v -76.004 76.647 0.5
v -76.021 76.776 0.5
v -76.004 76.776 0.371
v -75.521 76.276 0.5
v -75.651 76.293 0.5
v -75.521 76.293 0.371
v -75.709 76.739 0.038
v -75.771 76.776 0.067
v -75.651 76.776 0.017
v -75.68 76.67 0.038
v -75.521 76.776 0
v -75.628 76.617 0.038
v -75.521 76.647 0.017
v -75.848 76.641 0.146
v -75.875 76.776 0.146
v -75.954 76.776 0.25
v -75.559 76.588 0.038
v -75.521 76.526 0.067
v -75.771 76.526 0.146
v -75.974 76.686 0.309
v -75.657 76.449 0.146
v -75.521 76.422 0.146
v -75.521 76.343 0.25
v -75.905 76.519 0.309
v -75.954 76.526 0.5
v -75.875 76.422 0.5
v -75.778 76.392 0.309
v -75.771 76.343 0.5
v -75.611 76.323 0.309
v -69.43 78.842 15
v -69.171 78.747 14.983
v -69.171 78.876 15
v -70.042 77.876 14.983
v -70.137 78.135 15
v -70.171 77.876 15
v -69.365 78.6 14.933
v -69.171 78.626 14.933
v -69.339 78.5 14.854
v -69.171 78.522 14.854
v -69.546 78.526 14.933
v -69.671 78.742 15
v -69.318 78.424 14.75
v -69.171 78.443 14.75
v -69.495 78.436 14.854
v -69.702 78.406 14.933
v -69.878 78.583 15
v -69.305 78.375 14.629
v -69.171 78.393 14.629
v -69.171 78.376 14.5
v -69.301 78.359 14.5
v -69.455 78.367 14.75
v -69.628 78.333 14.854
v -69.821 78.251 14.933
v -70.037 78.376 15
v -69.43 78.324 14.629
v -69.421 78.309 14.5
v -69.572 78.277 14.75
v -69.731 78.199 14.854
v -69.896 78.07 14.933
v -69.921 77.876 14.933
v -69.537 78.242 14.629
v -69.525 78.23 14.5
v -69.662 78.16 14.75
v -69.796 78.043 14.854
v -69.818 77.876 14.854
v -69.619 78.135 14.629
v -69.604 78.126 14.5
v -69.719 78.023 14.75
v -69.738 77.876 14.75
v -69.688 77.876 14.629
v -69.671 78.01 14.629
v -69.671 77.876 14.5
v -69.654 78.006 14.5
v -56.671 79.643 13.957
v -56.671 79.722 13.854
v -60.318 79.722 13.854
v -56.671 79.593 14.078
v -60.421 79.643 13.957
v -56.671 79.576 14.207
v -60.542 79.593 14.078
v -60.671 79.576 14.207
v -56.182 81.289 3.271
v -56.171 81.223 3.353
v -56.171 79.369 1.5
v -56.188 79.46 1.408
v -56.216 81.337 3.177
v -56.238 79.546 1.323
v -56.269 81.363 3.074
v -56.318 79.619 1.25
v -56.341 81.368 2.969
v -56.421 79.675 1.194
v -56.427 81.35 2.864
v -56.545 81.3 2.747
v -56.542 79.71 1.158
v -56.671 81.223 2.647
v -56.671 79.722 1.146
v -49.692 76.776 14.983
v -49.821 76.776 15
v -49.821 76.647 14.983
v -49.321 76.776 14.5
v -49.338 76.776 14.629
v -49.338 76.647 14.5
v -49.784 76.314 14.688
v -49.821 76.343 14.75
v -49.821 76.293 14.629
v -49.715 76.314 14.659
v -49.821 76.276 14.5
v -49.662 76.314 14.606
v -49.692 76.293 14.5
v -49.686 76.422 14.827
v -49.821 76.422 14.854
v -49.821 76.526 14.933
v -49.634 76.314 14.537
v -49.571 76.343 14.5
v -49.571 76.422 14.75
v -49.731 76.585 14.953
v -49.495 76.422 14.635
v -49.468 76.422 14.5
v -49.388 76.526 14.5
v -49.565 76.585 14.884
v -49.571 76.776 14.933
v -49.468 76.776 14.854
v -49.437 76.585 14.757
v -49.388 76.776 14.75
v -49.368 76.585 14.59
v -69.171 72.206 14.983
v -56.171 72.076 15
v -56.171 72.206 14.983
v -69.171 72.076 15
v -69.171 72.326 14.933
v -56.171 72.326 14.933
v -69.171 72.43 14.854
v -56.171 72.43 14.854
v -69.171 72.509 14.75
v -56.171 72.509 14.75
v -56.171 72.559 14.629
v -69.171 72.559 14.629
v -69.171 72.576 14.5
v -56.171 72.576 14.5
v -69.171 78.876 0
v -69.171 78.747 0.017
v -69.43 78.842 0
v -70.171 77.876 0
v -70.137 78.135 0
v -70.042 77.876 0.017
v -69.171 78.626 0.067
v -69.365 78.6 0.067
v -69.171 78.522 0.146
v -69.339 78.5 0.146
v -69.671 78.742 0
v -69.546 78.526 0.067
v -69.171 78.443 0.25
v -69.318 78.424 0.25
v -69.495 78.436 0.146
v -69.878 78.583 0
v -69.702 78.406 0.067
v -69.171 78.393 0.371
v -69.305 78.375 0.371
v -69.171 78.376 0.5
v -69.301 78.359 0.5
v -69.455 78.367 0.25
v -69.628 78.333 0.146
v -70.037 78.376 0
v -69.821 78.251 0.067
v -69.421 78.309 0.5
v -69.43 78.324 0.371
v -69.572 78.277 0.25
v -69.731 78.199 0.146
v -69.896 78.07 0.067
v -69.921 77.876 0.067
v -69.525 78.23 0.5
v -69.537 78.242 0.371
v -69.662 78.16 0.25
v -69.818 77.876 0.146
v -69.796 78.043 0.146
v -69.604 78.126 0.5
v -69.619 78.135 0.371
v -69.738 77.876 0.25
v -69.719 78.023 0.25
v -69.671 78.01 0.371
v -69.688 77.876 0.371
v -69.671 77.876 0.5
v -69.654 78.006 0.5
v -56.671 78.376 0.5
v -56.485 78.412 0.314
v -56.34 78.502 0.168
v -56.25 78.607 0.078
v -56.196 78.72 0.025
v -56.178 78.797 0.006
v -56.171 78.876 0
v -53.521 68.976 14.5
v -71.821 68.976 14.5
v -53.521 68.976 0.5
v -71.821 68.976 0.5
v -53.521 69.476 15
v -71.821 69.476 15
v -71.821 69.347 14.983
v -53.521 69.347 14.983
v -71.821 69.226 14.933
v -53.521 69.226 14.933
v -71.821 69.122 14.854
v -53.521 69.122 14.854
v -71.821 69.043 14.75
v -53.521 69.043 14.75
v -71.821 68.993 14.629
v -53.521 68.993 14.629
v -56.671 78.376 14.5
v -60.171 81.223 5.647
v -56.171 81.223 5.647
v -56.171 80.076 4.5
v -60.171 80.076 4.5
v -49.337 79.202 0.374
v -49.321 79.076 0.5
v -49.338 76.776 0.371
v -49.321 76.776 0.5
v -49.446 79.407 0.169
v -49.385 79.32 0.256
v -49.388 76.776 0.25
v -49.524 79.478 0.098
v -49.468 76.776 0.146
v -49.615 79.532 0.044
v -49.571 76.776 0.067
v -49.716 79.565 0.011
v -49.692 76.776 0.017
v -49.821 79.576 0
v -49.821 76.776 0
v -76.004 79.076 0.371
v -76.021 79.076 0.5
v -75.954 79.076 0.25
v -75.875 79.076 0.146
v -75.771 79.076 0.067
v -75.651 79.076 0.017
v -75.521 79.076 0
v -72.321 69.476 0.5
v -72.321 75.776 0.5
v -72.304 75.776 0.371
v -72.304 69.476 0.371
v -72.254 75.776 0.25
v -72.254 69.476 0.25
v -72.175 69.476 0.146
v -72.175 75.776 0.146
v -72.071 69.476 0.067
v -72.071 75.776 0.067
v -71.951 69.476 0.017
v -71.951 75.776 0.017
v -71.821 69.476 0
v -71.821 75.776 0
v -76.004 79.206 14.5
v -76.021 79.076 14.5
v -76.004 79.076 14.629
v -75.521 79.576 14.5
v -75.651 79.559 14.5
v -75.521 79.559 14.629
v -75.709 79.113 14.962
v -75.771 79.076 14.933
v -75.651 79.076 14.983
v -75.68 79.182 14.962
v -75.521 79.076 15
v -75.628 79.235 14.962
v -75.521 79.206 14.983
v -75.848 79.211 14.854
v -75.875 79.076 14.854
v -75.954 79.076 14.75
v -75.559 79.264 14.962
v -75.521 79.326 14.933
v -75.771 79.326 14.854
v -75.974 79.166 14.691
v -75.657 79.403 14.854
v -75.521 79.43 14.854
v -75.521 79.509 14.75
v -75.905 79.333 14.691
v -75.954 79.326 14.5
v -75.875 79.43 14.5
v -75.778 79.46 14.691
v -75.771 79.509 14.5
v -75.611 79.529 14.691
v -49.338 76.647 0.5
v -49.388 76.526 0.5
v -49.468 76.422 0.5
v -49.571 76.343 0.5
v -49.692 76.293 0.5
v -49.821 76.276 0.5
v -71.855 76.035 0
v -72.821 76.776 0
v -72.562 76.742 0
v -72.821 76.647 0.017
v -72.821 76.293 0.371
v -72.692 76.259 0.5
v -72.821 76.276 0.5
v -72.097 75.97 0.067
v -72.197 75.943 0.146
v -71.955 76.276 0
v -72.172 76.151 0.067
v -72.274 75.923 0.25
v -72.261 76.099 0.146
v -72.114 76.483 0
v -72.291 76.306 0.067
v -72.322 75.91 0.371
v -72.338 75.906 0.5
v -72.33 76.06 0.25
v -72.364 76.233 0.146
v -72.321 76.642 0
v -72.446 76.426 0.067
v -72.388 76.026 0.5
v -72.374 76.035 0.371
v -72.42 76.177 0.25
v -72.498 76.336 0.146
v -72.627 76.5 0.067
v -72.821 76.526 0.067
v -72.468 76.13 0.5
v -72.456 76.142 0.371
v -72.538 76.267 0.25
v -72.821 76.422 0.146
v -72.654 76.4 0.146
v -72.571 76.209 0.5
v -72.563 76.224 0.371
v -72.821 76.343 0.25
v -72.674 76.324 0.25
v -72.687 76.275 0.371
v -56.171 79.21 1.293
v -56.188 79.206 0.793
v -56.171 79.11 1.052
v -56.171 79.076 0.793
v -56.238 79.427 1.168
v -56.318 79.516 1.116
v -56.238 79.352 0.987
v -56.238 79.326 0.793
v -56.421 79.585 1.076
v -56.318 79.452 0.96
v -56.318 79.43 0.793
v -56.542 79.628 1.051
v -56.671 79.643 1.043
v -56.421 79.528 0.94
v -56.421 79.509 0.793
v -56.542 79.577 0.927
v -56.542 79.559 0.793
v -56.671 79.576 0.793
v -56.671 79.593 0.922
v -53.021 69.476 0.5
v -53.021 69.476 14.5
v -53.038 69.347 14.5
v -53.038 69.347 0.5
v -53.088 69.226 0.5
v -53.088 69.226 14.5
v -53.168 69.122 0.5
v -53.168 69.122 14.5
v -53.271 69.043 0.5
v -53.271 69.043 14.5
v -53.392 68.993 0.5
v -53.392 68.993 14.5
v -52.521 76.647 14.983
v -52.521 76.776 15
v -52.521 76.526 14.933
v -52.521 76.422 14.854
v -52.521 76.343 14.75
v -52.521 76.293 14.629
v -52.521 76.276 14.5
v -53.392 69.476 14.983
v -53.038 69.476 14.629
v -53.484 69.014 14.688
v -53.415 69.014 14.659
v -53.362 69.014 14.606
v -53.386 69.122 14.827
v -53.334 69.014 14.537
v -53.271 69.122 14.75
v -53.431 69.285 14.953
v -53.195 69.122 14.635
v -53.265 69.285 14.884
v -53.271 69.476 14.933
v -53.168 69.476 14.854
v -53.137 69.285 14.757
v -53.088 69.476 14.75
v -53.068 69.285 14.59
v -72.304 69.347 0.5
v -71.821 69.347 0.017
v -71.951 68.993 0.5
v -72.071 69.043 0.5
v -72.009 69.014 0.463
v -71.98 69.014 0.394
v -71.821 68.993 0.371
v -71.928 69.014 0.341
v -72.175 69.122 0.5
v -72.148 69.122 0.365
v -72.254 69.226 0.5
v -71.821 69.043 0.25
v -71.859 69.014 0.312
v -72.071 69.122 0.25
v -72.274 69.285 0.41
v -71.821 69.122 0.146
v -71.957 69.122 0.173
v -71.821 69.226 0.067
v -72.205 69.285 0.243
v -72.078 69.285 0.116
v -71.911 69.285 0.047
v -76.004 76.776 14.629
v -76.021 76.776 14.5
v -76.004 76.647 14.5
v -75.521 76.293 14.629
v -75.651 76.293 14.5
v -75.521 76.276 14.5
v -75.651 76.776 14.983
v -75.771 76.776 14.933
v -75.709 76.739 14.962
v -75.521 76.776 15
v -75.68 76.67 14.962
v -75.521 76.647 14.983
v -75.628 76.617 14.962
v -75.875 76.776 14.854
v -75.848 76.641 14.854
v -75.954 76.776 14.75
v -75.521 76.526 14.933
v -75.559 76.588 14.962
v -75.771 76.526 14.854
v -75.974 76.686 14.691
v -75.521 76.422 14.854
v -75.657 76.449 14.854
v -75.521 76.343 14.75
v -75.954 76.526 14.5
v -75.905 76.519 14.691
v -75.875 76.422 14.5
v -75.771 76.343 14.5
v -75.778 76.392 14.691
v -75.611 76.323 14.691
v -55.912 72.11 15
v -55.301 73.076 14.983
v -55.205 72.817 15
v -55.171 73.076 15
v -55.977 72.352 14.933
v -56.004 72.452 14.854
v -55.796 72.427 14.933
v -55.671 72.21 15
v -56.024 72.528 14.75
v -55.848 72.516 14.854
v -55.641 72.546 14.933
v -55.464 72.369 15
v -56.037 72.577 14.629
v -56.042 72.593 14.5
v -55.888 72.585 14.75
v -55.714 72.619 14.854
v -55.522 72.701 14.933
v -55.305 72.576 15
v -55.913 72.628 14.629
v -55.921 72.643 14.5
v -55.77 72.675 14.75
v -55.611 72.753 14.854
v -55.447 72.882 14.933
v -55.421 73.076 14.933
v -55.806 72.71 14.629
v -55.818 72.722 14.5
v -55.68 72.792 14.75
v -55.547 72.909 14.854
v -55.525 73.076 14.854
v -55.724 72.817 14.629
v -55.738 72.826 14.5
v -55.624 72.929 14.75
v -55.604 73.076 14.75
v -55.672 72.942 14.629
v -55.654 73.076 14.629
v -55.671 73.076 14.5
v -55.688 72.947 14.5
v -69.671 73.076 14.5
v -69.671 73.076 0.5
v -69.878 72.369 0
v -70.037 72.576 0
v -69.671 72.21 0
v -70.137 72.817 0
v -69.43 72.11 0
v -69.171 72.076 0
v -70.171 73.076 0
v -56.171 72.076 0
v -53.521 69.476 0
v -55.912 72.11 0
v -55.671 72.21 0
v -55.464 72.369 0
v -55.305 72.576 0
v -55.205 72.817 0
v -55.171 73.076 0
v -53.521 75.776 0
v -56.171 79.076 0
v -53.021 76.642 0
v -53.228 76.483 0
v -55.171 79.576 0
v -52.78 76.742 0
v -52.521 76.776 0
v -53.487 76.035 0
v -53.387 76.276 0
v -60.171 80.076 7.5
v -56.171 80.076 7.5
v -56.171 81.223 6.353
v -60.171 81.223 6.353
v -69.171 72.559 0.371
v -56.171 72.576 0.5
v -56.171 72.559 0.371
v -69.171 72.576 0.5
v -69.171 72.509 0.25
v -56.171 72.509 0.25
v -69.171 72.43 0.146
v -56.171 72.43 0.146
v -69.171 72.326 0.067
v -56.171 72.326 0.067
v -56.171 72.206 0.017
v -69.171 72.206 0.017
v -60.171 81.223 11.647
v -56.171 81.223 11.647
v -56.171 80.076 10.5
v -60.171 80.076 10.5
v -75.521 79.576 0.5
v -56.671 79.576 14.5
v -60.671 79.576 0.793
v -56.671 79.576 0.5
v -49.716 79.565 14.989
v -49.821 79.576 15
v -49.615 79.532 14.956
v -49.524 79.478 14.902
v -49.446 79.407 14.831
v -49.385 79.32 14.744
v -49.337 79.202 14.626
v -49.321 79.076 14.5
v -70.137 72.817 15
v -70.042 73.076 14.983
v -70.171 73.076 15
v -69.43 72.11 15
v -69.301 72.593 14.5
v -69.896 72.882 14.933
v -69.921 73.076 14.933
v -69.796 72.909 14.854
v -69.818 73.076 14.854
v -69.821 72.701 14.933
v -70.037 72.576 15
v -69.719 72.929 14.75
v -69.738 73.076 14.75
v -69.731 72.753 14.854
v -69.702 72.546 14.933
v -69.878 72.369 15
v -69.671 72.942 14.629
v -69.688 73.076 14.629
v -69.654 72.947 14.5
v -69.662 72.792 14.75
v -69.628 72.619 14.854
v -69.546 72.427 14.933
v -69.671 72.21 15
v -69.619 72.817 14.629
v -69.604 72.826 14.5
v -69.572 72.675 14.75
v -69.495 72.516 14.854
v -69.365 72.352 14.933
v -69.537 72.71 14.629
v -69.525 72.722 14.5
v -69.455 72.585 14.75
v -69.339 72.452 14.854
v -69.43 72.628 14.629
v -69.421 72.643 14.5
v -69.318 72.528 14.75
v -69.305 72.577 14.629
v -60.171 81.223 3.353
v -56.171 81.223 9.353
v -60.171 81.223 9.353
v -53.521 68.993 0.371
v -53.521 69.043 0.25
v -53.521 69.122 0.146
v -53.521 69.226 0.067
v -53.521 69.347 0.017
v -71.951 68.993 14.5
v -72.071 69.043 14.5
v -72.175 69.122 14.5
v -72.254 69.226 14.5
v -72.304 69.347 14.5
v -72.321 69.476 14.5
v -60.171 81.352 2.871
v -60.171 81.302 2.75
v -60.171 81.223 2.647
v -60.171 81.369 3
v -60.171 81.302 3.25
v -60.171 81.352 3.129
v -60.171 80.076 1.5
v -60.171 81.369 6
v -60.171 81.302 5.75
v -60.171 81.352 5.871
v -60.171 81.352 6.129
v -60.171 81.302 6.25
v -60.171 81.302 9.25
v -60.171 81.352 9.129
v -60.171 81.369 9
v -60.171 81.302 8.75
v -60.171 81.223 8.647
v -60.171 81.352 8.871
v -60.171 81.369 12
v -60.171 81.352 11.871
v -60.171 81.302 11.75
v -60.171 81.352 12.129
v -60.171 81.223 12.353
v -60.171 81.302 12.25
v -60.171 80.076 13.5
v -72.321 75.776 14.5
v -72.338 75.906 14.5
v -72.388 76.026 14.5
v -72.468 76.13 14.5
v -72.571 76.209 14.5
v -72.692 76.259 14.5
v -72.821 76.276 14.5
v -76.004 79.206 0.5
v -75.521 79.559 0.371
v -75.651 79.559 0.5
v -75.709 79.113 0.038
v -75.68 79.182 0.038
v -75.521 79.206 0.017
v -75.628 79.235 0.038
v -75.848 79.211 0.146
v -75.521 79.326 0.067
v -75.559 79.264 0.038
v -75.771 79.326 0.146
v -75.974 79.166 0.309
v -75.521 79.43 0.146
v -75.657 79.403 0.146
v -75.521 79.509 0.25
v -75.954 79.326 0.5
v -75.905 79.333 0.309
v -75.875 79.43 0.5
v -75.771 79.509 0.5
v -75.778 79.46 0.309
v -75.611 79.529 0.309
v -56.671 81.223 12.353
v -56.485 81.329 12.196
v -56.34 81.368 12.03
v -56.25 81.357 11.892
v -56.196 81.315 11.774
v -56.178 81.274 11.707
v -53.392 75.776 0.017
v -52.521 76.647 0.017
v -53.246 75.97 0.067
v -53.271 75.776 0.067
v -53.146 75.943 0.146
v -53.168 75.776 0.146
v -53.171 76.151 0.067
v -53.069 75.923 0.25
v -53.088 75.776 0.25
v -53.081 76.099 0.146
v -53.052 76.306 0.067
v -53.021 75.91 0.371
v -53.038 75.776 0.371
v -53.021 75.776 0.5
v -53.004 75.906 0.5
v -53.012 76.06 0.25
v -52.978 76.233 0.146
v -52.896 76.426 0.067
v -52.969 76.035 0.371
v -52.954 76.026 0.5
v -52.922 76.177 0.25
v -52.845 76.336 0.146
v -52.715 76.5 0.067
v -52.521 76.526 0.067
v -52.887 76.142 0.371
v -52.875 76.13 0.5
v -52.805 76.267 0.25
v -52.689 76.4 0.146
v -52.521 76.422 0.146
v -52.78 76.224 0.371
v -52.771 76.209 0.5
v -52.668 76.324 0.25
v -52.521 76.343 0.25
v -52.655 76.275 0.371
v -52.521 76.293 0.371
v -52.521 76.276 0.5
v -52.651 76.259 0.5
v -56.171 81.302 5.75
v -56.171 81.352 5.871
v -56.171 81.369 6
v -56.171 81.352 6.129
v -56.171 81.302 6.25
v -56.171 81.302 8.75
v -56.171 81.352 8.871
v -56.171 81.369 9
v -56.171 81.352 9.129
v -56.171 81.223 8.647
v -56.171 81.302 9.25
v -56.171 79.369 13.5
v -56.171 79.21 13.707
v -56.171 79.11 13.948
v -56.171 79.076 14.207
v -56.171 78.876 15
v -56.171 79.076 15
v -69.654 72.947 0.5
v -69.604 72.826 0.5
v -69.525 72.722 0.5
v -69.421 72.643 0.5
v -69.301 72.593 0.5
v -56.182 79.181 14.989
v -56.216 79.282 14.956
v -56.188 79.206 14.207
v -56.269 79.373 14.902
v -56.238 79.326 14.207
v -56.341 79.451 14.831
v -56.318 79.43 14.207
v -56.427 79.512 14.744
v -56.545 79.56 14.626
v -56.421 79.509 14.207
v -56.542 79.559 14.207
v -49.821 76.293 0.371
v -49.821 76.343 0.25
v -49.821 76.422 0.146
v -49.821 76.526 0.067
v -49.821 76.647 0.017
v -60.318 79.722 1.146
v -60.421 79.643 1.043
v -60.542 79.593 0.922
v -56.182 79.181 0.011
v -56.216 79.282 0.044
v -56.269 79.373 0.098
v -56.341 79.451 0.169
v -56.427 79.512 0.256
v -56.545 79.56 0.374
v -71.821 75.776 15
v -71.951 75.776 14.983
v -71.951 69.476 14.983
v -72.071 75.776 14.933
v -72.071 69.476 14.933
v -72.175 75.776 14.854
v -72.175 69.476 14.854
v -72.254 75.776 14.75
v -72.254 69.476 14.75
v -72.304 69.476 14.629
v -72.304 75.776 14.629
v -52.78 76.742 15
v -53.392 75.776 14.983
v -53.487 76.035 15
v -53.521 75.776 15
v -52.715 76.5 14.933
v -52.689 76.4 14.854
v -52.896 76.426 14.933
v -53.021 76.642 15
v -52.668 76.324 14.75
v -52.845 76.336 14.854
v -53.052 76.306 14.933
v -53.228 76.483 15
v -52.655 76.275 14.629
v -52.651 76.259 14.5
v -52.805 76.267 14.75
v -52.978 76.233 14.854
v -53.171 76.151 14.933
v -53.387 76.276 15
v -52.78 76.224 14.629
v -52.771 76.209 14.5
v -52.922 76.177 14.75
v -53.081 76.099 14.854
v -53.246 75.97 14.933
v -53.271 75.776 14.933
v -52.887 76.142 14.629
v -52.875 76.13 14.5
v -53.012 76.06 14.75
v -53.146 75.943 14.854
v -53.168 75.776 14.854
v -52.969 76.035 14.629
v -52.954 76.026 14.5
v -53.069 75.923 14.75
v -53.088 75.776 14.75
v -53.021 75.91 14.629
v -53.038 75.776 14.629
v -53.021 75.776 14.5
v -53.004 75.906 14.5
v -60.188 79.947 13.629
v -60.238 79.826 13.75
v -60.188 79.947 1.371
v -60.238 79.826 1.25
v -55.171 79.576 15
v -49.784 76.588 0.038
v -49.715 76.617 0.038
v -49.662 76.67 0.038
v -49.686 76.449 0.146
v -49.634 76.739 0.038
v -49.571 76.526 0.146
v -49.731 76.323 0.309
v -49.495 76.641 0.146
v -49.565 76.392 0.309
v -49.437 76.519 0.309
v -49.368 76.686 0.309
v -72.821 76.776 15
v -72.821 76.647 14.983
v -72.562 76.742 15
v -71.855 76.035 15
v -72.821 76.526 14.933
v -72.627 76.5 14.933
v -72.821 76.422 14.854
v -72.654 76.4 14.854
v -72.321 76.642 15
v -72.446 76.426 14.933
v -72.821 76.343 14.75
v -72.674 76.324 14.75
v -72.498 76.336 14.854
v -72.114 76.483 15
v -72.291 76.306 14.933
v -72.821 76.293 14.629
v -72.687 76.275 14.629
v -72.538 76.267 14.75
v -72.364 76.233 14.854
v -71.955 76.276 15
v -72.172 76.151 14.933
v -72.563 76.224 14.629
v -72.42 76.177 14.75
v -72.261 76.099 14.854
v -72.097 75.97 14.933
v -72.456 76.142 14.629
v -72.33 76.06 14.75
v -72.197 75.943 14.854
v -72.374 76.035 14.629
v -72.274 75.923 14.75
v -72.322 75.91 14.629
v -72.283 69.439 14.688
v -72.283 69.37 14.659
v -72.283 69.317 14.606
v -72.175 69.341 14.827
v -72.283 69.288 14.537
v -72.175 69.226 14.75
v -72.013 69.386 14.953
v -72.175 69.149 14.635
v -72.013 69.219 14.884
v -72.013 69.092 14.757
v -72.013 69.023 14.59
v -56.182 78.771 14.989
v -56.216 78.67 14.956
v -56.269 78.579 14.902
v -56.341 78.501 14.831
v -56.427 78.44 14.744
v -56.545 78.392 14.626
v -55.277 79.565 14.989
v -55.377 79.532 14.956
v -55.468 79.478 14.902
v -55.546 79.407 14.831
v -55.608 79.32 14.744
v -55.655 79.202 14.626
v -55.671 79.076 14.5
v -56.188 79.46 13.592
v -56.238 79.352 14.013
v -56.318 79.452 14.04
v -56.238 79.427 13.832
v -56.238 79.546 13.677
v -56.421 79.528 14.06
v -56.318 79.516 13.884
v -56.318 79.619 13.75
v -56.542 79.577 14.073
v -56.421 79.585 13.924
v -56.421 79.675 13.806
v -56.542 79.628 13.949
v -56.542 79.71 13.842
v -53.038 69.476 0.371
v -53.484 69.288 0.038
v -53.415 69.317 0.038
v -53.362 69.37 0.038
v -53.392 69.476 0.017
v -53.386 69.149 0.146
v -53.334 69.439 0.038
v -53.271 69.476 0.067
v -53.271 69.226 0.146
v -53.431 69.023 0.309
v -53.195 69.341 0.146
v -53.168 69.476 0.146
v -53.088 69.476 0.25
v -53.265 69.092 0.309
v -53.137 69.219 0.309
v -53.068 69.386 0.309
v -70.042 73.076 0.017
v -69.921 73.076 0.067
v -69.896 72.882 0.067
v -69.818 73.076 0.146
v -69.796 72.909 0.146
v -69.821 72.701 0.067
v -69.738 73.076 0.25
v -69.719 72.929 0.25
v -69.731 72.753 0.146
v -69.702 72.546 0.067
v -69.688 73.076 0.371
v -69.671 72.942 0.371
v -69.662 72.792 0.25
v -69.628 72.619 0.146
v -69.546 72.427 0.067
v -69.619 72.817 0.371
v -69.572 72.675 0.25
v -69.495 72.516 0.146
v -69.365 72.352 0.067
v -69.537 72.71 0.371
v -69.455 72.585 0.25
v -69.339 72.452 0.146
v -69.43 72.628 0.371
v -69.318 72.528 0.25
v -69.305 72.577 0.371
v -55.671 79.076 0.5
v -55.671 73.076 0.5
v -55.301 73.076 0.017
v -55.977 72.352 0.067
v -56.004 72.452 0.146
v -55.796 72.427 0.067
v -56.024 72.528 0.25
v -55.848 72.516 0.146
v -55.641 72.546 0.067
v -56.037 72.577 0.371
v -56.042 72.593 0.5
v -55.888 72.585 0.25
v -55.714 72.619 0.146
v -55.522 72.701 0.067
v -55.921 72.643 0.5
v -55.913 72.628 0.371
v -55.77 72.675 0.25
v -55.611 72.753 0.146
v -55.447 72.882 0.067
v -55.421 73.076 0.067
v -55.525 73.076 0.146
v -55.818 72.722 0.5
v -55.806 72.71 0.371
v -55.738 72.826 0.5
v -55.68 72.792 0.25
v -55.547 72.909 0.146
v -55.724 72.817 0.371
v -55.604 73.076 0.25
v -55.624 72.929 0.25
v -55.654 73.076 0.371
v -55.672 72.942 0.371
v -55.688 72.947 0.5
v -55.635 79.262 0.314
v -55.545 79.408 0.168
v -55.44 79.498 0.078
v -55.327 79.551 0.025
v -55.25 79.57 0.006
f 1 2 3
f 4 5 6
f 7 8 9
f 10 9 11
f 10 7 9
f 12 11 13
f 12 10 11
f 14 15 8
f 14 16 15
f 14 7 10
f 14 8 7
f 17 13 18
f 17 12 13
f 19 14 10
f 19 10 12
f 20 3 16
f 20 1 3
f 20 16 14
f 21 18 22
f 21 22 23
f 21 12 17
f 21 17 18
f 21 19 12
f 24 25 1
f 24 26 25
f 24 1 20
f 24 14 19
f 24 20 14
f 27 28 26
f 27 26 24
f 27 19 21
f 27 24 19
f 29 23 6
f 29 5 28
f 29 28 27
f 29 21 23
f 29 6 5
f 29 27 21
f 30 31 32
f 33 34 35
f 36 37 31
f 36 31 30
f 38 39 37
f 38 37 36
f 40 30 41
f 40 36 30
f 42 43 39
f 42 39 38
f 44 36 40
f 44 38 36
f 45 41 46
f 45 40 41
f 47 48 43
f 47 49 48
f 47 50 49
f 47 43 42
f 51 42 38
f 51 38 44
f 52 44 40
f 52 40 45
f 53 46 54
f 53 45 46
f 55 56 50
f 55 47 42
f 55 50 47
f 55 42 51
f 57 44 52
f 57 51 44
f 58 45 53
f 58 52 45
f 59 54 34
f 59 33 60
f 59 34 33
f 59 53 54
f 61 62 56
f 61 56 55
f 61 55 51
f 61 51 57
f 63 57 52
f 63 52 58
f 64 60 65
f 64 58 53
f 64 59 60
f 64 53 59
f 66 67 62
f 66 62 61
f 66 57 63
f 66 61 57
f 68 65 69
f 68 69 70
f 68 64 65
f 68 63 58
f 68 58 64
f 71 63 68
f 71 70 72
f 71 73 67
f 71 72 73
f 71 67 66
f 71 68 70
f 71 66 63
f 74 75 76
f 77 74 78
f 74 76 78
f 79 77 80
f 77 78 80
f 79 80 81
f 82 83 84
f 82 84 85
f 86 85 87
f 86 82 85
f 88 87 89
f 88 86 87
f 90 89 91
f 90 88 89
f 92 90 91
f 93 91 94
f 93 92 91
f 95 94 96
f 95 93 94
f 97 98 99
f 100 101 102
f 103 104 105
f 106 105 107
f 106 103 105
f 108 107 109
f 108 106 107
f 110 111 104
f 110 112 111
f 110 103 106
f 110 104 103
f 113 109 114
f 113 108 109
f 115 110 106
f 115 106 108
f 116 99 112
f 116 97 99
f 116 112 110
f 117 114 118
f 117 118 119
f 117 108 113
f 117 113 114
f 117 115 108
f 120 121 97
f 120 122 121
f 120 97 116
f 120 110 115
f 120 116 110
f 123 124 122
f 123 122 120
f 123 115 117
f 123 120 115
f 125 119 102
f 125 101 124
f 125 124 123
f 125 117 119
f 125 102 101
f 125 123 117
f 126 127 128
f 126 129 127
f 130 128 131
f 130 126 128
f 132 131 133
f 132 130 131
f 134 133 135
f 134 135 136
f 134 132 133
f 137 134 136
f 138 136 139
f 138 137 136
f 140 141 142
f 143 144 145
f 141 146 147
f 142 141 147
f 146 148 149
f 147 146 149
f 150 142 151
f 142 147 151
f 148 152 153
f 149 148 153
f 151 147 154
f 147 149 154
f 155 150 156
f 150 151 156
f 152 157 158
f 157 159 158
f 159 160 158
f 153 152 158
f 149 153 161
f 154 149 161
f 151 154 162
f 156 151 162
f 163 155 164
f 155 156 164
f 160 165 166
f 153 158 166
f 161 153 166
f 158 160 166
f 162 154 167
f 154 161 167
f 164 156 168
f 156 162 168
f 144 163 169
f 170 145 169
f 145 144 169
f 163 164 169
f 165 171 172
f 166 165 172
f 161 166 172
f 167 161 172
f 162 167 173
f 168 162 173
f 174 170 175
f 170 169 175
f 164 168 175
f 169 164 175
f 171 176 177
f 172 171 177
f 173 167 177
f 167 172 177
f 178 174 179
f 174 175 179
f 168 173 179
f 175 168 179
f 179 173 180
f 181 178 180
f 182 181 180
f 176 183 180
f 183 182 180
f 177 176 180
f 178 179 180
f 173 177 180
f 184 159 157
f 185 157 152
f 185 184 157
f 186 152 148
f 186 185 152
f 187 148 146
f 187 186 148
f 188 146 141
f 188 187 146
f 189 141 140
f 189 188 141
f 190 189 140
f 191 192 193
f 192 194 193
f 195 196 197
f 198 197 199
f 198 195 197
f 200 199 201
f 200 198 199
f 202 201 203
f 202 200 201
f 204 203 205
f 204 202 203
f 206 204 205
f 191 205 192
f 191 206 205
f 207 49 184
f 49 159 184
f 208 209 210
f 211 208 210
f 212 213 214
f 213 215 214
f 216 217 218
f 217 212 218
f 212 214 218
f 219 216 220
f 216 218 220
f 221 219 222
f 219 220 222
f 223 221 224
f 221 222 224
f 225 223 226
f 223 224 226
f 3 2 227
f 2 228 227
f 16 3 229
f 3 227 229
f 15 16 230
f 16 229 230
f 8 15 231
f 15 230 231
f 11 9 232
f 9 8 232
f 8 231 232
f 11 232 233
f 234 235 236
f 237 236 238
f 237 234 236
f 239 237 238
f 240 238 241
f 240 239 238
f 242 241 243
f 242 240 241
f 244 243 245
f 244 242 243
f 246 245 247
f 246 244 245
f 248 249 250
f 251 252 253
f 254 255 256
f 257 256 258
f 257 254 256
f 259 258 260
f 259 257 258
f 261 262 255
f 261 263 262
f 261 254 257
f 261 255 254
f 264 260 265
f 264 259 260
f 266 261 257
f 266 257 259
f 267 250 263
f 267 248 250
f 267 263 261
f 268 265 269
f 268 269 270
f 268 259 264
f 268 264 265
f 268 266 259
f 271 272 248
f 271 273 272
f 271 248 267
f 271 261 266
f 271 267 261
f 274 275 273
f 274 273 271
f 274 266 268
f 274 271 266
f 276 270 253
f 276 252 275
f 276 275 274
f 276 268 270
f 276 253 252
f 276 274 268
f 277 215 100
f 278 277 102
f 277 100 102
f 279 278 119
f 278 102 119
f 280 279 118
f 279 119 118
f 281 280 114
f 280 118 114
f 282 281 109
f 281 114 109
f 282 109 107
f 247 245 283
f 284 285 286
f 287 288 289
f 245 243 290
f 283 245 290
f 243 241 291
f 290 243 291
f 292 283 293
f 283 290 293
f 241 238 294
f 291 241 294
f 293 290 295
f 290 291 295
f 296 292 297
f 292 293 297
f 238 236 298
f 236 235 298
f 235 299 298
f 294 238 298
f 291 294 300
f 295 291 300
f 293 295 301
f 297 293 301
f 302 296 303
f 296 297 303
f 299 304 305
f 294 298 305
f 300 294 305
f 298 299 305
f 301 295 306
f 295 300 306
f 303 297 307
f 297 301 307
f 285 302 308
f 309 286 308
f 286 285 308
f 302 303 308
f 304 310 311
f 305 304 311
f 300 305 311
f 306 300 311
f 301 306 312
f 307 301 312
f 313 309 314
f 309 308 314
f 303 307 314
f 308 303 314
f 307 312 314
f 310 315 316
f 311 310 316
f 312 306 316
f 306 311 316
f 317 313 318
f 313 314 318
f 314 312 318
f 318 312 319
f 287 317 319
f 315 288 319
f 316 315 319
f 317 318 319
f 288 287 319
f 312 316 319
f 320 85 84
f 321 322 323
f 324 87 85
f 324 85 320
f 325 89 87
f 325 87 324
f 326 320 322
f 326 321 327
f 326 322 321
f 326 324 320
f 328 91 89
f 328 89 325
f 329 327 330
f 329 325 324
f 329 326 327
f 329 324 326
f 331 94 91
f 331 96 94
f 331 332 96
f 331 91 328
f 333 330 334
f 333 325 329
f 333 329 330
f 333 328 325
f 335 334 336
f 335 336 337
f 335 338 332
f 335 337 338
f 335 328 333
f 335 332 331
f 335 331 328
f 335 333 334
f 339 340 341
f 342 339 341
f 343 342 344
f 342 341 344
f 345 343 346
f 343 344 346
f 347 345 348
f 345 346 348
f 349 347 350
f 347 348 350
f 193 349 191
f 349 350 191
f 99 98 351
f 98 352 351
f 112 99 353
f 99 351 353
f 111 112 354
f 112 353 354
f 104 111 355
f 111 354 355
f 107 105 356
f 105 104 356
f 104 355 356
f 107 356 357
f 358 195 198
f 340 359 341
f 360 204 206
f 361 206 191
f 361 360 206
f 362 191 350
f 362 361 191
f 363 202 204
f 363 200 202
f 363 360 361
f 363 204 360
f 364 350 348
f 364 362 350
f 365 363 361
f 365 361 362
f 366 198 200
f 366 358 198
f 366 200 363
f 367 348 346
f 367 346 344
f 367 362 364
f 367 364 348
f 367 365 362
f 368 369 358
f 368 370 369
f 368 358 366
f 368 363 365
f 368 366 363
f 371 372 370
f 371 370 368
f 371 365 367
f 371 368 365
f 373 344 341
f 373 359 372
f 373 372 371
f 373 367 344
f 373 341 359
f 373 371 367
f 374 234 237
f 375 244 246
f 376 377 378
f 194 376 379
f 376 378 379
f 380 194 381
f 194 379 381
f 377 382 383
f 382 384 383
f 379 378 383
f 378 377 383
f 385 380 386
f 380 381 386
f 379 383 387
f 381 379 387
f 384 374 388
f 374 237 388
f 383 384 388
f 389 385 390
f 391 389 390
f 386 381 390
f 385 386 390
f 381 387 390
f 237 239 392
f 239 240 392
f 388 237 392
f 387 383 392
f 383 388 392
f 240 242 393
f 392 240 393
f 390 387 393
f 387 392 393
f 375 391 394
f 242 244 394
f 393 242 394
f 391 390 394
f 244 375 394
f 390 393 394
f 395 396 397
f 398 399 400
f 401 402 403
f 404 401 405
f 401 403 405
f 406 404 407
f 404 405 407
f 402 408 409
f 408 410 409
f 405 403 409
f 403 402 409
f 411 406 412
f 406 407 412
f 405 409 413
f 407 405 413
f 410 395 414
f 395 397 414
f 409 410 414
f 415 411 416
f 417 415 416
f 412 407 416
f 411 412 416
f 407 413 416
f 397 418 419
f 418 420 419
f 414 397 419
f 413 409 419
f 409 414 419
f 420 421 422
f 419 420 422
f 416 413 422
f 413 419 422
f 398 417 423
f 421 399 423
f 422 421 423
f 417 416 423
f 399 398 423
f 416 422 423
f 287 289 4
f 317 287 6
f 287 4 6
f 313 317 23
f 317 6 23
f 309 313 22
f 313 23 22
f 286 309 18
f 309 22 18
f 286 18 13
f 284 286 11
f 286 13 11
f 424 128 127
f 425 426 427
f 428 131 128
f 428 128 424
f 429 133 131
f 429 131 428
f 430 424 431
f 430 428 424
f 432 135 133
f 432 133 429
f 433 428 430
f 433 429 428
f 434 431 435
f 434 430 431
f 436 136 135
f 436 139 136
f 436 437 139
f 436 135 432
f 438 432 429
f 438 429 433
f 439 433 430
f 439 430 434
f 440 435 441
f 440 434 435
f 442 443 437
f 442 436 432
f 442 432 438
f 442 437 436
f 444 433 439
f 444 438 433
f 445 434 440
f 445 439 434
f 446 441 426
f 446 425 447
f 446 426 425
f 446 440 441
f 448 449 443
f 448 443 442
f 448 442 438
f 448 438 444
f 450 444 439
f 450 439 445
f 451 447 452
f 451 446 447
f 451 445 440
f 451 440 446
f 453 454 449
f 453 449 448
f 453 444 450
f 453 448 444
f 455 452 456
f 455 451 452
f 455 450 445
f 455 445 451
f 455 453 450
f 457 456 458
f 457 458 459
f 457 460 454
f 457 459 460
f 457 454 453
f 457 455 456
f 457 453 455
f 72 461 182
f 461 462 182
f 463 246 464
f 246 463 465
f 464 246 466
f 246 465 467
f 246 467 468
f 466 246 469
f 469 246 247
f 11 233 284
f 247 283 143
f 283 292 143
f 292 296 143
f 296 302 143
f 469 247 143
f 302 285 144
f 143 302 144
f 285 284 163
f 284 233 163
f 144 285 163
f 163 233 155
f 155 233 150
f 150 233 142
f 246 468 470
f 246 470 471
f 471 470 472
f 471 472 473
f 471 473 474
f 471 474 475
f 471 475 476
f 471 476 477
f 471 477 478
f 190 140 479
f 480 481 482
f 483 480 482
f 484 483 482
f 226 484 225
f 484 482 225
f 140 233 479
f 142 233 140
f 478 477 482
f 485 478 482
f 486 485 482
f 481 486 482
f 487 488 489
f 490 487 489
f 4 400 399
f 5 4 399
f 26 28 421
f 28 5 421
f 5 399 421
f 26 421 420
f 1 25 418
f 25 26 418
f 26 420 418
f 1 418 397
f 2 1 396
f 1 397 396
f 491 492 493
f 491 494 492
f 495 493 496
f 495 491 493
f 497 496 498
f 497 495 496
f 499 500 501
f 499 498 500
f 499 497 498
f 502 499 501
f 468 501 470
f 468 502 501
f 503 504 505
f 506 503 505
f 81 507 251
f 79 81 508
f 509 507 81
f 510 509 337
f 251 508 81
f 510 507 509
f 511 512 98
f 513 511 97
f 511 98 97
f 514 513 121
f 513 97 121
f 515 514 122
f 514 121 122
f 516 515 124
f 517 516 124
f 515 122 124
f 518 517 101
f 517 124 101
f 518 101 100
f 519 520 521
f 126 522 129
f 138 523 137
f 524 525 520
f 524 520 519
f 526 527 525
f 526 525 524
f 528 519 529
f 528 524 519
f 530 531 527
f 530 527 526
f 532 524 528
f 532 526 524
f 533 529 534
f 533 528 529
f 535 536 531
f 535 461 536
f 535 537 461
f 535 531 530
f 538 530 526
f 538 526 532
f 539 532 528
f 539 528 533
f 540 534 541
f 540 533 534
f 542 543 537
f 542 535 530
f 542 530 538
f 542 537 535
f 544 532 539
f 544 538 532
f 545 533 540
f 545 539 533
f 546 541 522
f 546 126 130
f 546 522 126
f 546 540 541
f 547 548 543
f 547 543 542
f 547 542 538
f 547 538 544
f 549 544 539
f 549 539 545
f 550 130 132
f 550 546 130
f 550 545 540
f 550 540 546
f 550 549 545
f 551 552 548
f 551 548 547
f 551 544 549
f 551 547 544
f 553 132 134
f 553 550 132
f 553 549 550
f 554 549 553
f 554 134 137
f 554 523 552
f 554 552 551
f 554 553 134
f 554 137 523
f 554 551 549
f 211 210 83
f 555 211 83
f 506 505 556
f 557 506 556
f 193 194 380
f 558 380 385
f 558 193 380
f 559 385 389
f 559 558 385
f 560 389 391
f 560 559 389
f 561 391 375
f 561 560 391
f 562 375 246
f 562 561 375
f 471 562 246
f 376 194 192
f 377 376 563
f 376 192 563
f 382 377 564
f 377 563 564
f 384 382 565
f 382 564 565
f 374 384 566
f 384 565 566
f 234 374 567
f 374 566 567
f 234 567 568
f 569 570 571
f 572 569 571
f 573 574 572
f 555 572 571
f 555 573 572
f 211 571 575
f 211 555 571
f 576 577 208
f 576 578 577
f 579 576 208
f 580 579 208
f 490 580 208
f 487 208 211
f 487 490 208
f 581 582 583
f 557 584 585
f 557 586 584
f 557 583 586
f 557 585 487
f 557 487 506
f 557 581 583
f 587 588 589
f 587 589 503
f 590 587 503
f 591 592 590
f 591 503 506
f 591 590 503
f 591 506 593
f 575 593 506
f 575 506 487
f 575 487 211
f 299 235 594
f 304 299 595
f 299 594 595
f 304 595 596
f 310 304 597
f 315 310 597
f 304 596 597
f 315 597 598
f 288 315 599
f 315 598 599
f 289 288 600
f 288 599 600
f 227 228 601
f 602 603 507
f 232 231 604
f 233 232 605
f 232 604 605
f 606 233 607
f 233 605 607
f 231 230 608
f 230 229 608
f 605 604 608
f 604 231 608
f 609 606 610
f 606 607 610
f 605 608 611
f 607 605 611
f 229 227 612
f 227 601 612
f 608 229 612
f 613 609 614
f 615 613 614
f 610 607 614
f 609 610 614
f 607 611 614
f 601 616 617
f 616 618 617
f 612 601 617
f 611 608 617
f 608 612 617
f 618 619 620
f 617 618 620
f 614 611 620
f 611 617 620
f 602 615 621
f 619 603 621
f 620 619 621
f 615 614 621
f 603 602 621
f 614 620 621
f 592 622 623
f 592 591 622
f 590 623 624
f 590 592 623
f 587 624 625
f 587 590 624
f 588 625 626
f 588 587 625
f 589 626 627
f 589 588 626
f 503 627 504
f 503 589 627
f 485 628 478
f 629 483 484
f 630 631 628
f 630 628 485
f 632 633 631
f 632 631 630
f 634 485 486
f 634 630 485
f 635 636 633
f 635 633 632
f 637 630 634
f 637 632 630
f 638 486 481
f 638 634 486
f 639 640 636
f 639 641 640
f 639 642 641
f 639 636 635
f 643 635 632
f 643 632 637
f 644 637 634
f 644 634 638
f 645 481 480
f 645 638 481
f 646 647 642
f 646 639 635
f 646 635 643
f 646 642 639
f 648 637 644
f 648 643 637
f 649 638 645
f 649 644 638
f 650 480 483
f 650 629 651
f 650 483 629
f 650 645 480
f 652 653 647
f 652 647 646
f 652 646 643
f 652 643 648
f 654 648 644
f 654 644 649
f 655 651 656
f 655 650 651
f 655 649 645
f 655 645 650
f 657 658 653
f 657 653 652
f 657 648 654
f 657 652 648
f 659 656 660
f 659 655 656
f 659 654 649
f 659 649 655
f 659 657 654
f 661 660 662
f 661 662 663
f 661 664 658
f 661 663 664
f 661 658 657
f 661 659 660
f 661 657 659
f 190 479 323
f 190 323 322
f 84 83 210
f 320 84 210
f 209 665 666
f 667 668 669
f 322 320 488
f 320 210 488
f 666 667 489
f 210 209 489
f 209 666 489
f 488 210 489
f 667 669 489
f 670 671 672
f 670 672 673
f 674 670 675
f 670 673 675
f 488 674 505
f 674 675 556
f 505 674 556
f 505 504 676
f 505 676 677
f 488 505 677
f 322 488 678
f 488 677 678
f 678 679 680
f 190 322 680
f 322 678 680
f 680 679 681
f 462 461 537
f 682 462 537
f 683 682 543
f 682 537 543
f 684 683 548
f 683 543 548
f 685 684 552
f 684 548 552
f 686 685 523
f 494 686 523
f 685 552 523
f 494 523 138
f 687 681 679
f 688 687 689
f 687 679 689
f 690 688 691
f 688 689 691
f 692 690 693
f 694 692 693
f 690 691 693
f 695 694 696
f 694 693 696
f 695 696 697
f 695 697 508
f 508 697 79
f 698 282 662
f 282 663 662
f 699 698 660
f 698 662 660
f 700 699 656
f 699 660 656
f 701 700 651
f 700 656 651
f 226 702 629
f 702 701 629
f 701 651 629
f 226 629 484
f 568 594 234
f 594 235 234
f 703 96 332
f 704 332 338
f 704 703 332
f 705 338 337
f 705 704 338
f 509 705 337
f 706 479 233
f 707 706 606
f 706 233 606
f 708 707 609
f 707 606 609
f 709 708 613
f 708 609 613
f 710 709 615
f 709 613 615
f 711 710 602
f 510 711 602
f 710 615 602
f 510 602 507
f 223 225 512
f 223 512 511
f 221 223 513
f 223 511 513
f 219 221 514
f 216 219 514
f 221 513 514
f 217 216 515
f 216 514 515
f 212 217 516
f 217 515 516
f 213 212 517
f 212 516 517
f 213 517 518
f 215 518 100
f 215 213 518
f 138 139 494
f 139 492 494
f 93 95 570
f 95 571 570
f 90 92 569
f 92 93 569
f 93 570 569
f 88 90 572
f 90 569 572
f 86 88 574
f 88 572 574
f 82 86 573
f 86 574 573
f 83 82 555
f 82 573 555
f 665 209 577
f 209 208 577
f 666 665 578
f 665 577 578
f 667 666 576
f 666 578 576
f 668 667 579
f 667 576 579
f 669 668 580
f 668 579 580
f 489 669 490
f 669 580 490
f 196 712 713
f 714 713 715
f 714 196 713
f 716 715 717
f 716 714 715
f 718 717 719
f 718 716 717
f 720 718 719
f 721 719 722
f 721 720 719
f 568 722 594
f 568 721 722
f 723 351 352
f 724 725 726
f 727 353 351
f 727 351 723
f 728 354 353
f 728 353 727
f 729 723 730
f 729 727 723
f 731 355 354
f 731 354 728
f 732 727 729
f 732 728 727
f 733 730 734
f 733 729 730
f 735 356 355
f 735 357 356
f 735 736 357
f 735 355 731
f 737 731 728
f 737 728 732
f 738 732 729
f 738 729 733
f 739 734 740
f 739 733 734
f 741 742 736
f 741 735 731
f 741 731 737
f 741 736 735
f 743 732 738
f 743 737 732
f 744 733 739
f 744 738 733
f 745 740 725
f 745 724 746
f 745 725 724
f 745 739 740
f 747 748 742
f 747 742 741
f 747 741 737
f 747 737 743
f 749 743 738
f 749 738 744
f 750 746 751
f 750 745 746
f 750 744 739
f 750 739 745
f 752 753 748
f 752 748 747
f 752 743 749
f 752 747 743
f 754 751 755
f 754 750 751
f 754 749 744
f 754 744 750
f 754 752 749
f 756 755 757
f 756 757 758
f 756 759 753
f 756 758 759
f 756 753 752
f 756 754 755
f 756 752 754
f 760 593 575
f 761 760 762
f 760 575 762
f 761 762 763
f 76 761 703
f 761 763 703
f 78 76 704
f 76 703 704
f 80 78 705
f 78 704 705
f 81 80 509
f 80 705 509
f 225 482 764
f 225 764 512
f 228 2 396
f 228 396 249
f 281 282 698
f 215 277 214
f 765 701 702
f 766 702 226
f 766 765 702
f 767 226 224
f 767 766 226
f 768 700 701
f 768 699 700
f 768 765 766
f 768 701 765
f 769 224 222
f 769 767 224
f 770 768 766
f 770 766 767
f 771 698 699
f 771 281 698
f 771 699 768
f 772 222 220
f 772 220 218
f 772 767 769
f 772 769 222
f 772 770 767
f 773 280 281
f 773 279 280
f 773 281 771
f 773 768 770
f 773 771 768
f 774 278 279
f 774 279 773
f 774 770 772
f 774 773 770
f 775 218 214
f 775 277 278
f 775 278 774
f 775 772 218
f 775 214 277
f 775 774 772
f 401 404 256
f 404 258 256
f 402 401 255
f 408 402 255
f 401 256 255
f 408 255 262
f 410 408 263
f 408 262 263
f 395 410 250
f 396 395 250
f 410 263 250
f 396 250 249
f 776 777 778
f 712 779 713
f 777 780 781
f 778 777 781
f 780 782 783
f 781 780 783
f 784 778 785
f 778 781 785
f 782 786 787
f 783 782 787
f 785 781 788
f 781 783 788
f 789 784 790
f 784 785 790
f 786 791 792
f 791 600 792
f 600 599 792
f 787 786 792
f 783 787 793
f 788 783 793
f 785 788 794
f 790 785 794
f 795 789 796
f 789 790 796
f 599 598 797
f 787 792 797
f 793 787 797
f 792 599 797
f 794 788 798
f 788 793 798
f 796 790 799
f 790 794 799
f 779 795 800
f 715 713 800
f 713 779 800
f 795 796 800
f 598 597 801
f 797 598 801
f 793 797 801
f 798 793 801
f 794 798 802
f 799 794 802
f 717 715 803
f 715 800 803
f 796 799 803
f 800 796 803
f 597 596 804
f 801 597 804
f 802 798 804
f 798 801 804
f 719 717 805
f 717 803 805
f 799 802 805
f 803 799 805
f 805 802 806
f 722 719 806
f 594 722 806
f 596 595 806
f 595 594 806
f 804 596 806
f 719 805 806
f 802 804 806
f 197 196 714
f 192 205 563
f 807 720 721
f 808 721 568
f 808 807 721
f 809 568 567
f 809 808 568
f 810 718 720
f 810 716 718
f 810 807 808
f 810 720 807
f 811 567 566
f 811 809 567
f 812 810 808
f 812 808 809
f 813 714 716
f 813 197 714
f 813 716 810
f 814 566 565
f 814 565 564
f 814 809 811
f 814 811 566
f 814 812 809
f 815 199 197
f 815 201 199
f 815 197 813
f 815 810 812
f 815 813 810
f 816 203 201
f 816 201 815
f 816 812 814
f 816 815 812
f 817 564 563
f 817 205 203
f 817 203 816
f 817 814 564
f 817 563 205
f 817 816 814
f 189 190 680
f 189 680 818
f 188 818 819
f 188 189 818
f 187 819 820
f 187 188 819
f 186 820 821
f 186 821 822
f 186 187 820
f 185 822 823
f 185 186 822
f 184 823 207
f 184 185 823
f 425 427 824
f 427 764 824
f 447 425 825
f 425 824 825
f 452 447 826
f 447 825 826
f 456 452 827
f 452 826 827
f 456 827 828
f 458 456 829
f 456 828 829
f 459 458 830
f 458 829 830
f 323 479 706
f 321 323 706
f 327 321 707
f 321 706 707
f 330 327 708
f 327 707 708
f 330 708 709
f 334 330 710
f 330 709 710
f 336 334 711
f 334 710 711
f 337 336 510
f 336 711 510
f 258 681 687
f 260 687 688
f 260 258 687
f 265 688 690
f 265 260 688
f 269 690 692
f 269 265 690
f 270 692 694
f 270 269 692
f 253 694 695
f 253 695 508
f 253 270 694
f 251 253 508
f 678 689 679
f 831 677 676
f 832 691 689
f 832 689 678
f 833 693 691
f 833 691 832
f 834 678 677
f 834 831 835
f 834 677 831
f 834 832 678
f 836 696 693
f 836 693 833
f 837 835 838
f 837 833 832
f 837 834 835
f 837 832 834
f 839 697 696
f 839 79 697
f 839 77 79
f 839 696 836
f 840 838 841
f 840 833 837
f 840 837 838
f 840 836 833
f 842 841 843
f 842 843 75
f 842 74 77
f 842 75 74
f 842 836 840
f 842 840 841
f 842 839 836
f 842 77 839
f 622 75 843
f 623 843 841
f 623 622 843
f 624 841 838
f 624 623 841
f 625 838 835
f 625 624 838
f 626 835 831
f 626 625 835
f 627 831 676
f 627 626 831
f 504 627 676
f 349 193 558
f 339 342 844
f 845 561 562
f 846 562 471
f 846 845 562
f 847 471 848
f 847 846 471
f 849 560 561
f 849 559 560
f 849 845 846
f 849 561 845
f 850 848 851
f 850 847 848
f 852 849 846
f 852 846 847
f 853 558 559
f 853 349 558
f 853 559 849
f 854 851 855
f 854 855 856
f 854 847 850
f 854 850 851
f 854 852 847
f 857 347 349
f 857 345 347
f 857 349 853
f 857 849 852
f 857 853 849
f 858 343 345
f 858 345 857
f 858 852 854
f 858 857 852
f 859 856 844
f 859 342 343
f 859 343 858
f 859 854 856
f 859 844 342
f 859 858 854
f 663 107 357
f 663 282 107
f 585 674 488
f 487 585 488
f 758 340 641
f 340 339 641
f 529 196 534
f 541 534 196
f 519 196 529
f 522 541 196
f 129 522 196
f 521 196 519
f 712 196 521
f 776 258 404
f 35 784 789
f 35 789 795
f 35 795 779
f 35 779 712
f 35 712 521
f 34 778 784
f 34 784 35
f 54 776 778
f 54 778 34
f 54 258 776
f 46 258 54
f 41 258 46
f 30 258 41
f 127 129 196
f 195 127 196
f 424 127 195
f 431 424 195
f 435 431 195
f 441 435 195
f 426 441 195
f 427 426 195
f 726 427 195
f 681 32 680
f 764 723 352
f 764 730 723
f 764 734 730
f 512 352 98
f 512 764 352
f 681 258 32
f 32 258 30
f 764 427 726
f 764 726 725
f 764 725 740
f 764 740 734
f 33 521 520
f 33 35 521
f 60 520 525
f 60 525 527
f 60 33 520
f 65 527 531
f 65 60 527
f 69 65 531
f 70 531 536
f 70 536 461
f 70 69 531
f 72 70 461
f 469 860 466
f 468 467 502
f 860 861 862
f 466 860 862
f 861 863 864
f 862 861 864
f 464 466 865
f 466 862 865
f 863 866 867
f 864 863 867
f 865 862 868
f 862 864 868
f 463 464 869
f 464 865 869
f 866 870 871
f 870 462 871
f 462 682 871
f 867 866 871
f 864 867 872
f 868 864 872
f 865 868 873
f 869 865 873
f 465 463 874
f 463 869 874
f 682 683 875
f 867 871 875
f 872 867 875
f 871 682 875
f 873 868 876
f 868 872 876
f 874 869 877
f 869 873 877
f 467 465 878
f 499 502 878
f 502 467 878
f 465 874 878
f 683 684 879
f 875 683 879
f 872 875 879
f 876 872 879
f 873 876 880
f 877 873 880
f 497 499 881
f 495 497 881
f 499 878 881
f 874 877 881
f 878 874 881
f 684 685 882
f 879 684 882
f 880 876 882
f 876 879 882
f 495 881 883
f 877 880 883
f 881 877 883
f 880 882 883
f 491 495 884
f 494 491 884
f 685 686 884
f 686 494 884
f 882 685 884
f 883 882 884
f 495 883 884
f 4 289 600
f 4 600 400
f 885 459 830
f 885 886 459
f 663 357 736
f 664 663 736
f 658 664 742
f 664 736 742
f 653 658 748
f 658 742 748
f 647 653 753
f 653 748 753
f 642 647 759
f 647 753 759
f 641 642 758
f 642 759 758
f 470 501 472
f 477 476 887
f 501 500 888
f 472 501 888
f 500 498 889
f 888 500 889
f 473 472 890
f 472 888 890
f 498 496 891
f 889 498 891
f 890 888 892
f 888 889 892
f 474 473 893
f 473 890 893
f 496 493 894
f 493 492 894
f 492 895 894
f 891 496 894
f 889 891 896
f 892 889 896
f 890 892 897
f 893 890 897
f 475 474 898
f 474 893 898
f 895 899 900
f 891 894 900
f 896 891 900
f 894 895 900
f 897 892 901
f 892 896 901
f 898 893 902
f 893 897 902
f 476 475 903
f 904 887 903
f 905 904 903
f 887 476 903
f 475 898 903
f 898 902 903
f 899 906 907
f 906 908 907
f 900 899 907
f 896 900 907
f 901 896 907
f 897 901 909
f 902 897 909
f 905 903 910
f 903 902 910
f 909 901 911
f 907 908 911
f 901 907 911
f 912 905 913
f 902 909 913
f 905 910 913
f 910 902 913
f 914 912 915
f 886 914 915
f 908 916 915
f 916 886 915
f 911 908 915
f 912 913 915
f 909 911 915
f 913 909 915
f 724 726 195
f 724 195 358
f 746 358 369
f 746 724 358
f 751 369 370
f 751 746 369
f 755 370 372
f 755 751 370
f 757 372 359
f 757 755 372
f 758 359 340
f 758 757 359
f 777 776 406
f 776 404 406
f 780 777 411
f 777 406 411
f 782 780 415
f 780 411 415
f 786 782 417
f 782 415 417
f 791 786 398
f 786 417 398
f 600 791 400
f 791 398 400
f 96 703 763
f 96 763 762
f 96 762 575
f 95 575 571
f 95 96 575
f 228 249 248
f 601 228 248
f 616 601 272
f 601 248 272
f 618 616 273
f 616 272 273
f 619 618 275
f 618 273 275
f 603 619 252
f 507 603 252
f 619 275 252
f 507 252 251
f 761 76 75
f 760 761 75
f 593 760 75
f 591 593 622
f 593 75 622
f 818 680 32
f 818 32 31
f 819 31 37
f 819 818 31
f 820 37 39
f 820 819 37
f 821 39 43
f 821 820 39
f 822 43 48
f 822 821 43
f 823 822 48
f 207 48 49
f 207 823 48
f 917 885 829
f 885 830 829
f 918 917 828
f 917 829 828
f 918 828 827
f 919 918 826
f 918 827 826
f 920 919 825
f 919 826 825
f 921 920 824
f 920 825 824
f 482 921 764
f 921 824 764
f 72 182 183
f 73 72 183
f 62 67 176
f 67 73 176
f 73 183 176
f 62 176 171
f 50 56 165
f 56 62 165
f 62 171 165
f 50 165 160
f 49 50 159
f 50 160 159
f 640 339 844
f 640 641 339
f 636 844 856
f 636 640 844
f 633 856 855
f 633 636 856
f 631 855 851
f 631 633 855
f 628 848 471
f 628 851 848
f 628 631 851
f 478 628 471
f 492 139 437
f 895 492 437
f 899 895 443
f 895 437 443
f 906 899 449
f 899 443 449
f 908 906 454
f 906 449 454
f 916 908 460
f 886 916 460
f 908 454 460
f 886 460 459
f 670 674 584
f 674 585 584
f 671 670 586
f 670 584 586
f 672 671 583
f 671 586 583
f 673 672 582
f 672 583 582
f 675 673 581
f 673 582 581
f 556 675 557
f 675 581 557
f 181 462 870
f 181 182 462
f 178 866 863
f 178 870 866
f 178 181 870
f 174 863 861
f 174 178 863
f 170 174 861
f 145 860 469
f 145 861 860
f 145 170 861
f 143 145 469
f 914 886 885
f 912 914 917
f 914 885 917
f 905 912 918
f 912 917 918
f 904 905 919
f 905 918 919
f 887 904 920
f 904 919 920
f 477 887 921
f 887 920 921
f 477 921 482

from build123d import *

# Parameters (mm, degrees)
SKETCH2_W           = 9.65
SKETCH2_H           = 3.6
BOSS_EXTRUDE1_DEPTH = 15
SKETCH4_W           = 14
SKETCH4_H           = 7
CUT_EXTRUDE1_DEPTH  = 112.070154559
SKETCH5_W           = 13.5
SKETCH5_H           = 15
BOSS_EXTRUDE2_DEPTH = 1.2
SKETCH6_W           = 3
SKETCH6_H           = 0.5
BOSS_EXTRUDE3_DEPTH = 4
LPATTERN1_COUNT     = 4
LPATTERN1_PITCH     = 3
BOSS_EXTRUDE4_DEPTH = 4
FILLET1_R           = 0.5


with BuildPart() as part:
    # Sketch2 → Boss-Extrude1 (new body)
    with BuildSketch(Plane.XY):
        Polygon((-76.021288744, 76.276019576), (-76.021288744, 79.576019576), (-49.321288744, 79.576019576), (-49.321288744, 76.276019576), (-53.021288744, 76.276019576), (-53.021288744, 72.576019576), (-72.321288744, 72.576019576), (-72.321288744, 76.276019576), align=None)
        with Locations((-57.846288744, 70.776019576)):
            Rectangle(SKETCH2_W, SKETCH2_H)
        with Locations((-67.496288744, 70.776019576)):
            Rectangle(SKETCH2_W, SKETCH2_H)
    extrude(amount=BOSS_EXTRUDE1_DEPTH)

    # Sketch4 → Cut-Extrude1 (cut, through all)
    with BuildSketch(Plane(origin=(0, 0, 0), x_dir=(-1, 0, 0), z_dir=(0, 0, -1))):
        with Locations((62.671288744, 76.076019576)):
            Rectangle(SKETCH4_W, SKETCH4_H)
    extrude(amount=-CUT_EXTRUDE1_DEPTH, mode=Mode.SUBTRACT)

    # Sketch5 → Boss-Extrude2 (add)
    with BuildSketch(Plane(origin=(0, 79.576019576, 0), x_dir=(1, 0, 0), z_dir=(0, 1, 0))):
        with Locations((-62.921288744, -7.5)):
            Rectangle(SKETCH5_W, SKETCH5_H)
    extrude(amount=-BOSS_EXTRUDE2_DEPTH)

    # Sketch6 → Boss-Extrude3 (add)
    with BuildSketch(Plane(origin=(-56.171288744, 0, 0), x_dir=(0, 0, -1), z_dir=(1, 0, 0))):
        with Locations((-12, 79.826019576)):
            Rectangle(SKETCH6_W, SKETCH6_H)
        Polygon((-10.5, 80.076019576), (-13.5, 80.076019576), (-12, 81.576019576), align=None)
    boss_extrude3 = extrude(amount=-BOSS_EXTRUDE3_DEPTH)

    # LPattern1: Boss-Extrude3 ×4
    with Locations(*[(0, 0, -i * LPATTERN1_PITCH) for i in range(1, LPATTERN1_COUNT)]):
        add(boss_extrude3)

    # Sketch7 → Boss-Extrude4 (add)
    with BuildSketch(Plane(origin=(-56.171288744, 0, 0), x_dir=(0, 0, -1), z_dir=(1, 0, 0))):
        Polygon((-13.5, 80.076019576), (-13.5, 79.576019576), (-14, 79.576019576), align=None)
        Polygon((-1.5, 80.076019576), (-1.5, 79.576019576), (-1, 79.576019576), align=None)
    extrude(amount=-BOSS_EXTRUDE4_DEPTH)

    # Fillet1
    fillet1_edges = [part.edges().sort_by_distance(p)[0] for p in [
        (-76.021288744, 76.276019576, 7.5),
        (-76.021288744, 79.576019576, 7.5),
        (-76.021288744, 77.926019576, 0),
        (-76.021288744, 77.926019576, 15),
        (-74.171288744, 76.276019576, 15),
        (-66.096288744, 79.576019576, 15),
        (-62.921288744, 78.376019576, 15),
        (-69.671288744, 75.476019576, 15),
        (-62.671288744, 72.576019576, 15),
        (-55.671288744, 76.076019576, 15),
        (-49.321288744, 77.926019576, 15),
        (-51.171288744, 76.276019576, 15),
        (-53.021288744, 72.626019576, 15),
        (-62.671288744, 68.976019576, 15),
        (-72.321288744, 72.626019576, 15),
        (-72.321288744, 76.276019576, 7.5),
        (-72.321288744, 72.626019576, 0),
        (-72.321288744, 68.976019576, 7.5),
        (-53.021288744, 68.976019576, 7.5),
        (-62.671288744, 68.976019576, 0),
        (-53.021288744, 76.276019576, 7.5),
        (-53.021288744, 72.626019576, 0),
        (-49.321288744, 76.276019576, 7.5),
        (-51.171288744, 76.276019576, 0),
        (-49.321288744, 79.576019576, 7.5),
        (-49.321288744, 77.926019576, 0),
        (-55.671288744, 79.576019576, 7.5),
        (-55.671288744, 76.076019576, 0),
        (-55.671288744, 72.576019576, 7.5),
        (-62.671288744, 72.576019576, 0),
        (-69.671288744, 72.576019576, 7.5),
        (-69.671288744, 75.476019576, 0),
        (-69.671288744, 78.376019576, 7.5),
        (-62.921288744, 78.376019576, 0),
        (-56.171288744, 78.376019576, 7.5),
        (-56.171288744, 79.576019576, 14.5),
        (-56.171288744, 80.576019576, 13),
        (-56.171288744, 80.576019576, 2),
        (-56.171288744, 79.576019576, 0.5),
        (-58.171288744, 79.576019576, 1),
        (-58.171288744, 81.576019576, 3),
        (-60.171288744, 79.576019576, 7.5),
        (-58.171288744, 81.576019576, 6),
        (-58.171288744, 81.576019576, 9),
        (-58.171288744, 81.576019576, 12),
        (-58.171288744, 79.576019576, 14),
        (-74.171288744, 76.276019576, 0),
        (-66.096288744, 79.576019576, 0),
    ]]
    fillet(fillet1_edges, radius=FILLET1_R - 0.0001)  # a hair under: the kernel refuses the full size


solid = part.part
